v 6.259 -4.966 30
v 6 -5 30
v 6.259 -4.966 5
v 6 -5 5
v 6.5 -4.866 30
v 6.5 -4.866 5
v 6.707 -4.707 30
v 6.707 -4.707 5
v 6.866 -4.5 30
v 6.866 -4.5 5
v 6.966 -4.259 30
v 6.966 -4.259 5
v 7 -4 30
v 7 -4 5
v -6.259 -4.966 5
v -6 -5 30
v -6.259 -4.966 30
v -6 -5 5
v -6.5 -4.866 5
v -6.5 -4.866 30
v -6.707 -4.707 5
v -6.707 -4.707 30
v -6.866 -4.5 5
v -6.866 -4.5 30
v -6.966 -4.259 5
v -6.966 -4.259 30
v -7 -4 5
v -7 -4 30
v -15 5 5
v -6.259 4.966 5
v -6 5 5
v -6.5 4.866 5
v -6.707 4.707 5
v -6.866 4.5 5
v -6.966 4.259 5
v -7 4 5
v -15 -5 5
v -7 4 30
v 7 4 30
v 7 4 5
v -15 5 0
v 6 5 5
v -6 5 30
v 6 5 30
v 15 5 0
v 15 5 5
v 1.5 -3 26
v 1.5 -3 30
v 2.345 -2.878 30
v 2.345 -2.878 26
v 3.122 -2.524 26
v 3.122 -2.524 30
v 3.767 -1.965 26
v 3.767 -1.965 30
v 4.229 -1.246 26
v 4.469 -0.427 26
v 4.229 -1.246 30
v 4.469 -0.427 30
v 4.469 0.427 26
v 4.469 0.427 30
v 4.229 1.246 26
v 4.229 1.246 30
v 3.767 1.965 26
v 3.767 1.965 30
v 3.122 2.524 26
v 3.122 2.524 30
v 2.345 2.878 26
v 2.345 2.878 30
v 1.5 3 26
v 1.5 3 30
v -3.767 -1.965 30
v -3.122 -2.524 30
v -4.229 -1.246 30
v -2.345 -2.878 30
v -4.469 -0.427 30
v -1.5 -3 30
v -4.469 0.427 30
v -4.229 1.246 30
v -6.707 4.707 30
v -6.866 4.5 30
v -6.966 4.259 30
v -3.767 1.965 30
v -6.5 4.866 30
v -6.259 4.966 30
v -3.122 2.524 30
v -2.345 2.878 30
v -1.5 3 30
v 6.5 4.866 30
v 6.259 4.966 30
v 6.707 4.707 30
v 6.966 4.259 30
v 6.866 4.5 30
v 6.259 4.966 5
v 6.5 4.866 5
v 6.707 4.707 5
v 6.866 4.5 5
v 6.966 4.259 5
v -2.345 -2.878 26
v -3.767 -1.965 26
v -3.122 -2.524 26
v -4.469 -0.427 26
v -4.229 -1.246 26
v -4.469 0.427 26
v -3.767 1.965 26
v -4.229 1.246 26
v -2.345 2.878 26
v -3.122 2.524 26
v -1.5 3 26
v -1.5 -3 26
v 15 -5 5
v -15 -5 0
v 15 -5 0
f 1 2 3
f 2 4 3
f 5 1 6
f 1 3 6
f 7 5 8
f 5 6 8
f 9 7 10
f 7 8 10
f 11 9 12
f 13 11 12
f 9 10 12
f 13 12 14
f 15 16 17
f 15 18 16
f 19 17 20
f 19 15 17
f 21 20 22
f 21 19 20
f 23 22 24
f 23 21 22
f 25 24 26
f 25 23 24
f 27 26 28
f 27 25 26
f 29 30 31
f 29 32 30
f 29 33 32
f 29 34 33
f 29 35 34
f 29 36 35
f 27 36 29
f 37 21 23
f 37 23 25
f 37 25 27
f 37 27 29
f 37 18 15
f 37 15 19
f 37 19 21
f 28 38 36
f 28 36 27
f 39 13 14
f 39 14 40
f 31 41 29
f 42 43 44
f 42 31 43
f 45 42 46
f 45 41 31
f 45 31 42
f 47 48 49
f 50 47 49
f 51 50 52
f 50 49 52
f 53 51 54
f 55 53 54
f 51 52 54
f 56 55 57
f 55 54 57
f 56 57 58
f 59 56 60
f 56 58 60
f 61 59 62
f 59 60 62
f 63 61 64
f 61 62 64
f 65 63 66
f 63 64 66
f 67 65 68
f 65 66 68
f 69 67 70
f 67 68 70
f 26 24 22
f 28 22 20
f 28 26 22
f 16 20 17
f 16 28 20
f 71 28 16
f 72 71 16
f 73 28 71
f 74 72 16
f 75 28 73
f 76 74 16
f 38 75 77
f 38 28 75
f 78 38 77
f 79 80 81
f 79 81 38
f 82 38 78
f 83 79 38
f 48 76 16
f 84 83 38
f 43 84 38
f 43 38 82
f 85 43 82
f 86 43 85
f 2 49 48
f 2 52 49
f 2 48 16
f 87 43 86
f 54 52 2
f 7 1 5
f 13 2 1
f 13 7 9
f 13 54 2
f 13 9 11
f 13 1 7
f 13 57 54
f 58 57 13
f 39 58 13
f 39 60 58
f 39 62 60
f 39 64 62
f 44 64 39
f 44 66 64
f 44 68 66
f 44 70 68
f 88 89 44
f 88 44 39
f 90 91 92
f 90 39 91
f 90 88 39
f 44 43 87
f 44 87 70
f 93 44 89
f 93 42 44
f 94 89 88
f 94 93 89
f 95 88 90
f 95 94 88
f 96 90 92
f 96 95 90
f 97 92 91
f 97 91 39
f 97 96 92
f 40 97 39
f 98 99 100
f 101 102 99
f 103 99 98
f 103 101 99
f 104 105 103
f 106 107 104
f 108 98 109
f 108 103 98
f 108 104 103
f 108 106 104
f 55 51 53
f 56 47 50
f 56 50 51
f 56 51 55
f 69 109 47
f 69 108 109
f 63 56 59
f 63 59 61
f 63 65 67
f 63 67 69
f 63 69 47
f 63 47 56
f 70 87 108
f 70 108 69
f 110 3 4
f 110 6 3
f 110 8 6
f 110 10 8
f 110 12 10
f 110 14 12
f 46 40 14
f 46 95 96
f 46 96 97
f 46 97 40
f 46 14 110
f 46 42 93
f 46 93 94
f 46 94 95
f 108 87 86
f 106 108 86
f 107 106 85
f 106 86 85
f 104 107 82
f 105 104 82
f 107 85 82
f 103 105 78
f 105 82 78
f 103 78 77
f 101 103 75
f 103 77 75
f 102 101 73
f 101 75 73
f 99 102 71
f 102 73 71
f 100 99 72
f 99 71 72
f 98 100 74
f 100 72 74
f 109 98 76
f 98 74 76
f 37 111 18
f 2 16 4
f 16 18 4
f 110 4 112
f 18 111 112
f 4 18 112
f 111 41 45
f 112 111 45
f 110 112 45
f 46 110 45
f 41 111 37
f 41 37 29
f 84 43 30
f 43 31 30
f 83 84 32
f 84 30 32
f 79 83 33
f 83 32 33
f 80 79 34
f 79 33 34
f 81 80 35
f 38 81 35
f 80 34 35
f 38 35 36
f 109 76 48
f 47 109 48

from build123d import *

# Parameters (mm, degrees)
SKETCH_W           = 30
SKETCH_H           = 10
PAD_DEPTH          = 30
POCKET_DEPTH       = 4
SKETCH003_W        = 15
SKETCH003_H        = 10
POCKET001_DEPTH    = 25
POLARPATTERN_COUNT = 2
FILLET_R           = 1


with BuildPart() as part:
    # Sketch → Pad (new body)
    with BuildSketch(Plane.XY):
        Rectangle(SKETCH_W, SKETCH_H)
    extrude(amount=PAD_DEPTH)

    # Sketch001 → Pocket (cut)
    with BuildSketch(Plane.XY.offset(30)):
        with BuildLine():
            ThreePointArc((-1.5, 3), (-4.5, 0), (-1.5, -3))
            Line((-1.5, -3), (1.5, -3))
            ThreePointArc((1.5, -3), (4.5, 0), (1.5, 3))
            Line((-1.5, 3), (1.5, 3))
        make_face()
    extrude(amount=-POCKET_DEPTH, mode=Mode.SUBTRACT)

    # Sketch003 → Pocket001 (cut)
    with BuildSketch(Plane.XY.offset(30)):
        with Locations((14.5, 0)):
            Rectangle(SKETCH003_W, SKETCH003_H)
    pocket001 = extrude(amount=-POCKET001_DEPTH, mode=Mode.SUBTRACT)

    # PolarPattern: Pocket001 ×2 about axis
    polarpattern_axis = Axis((0, 0, 30), (0, 0, 1))
    for i in range(1, POLARPATTERN_COUNT):
        add(pocket001.rotate(polarpattern_axis, i * 360 / POLARPATTERN_COUNT), mode=Mode.SUBTRACT)

    # Fillet
    fillet_edges = [part.edges().sort_by_distance(p)[0] for p in [
        (-7, 5, 17.5),
        (-7, -5, 17.5),
        (7, -5, 17.5),
        (7, 5, 17.5),
    ]]
    fillet(fillet_edges, radius=FILLET_R)


solid = part.part
